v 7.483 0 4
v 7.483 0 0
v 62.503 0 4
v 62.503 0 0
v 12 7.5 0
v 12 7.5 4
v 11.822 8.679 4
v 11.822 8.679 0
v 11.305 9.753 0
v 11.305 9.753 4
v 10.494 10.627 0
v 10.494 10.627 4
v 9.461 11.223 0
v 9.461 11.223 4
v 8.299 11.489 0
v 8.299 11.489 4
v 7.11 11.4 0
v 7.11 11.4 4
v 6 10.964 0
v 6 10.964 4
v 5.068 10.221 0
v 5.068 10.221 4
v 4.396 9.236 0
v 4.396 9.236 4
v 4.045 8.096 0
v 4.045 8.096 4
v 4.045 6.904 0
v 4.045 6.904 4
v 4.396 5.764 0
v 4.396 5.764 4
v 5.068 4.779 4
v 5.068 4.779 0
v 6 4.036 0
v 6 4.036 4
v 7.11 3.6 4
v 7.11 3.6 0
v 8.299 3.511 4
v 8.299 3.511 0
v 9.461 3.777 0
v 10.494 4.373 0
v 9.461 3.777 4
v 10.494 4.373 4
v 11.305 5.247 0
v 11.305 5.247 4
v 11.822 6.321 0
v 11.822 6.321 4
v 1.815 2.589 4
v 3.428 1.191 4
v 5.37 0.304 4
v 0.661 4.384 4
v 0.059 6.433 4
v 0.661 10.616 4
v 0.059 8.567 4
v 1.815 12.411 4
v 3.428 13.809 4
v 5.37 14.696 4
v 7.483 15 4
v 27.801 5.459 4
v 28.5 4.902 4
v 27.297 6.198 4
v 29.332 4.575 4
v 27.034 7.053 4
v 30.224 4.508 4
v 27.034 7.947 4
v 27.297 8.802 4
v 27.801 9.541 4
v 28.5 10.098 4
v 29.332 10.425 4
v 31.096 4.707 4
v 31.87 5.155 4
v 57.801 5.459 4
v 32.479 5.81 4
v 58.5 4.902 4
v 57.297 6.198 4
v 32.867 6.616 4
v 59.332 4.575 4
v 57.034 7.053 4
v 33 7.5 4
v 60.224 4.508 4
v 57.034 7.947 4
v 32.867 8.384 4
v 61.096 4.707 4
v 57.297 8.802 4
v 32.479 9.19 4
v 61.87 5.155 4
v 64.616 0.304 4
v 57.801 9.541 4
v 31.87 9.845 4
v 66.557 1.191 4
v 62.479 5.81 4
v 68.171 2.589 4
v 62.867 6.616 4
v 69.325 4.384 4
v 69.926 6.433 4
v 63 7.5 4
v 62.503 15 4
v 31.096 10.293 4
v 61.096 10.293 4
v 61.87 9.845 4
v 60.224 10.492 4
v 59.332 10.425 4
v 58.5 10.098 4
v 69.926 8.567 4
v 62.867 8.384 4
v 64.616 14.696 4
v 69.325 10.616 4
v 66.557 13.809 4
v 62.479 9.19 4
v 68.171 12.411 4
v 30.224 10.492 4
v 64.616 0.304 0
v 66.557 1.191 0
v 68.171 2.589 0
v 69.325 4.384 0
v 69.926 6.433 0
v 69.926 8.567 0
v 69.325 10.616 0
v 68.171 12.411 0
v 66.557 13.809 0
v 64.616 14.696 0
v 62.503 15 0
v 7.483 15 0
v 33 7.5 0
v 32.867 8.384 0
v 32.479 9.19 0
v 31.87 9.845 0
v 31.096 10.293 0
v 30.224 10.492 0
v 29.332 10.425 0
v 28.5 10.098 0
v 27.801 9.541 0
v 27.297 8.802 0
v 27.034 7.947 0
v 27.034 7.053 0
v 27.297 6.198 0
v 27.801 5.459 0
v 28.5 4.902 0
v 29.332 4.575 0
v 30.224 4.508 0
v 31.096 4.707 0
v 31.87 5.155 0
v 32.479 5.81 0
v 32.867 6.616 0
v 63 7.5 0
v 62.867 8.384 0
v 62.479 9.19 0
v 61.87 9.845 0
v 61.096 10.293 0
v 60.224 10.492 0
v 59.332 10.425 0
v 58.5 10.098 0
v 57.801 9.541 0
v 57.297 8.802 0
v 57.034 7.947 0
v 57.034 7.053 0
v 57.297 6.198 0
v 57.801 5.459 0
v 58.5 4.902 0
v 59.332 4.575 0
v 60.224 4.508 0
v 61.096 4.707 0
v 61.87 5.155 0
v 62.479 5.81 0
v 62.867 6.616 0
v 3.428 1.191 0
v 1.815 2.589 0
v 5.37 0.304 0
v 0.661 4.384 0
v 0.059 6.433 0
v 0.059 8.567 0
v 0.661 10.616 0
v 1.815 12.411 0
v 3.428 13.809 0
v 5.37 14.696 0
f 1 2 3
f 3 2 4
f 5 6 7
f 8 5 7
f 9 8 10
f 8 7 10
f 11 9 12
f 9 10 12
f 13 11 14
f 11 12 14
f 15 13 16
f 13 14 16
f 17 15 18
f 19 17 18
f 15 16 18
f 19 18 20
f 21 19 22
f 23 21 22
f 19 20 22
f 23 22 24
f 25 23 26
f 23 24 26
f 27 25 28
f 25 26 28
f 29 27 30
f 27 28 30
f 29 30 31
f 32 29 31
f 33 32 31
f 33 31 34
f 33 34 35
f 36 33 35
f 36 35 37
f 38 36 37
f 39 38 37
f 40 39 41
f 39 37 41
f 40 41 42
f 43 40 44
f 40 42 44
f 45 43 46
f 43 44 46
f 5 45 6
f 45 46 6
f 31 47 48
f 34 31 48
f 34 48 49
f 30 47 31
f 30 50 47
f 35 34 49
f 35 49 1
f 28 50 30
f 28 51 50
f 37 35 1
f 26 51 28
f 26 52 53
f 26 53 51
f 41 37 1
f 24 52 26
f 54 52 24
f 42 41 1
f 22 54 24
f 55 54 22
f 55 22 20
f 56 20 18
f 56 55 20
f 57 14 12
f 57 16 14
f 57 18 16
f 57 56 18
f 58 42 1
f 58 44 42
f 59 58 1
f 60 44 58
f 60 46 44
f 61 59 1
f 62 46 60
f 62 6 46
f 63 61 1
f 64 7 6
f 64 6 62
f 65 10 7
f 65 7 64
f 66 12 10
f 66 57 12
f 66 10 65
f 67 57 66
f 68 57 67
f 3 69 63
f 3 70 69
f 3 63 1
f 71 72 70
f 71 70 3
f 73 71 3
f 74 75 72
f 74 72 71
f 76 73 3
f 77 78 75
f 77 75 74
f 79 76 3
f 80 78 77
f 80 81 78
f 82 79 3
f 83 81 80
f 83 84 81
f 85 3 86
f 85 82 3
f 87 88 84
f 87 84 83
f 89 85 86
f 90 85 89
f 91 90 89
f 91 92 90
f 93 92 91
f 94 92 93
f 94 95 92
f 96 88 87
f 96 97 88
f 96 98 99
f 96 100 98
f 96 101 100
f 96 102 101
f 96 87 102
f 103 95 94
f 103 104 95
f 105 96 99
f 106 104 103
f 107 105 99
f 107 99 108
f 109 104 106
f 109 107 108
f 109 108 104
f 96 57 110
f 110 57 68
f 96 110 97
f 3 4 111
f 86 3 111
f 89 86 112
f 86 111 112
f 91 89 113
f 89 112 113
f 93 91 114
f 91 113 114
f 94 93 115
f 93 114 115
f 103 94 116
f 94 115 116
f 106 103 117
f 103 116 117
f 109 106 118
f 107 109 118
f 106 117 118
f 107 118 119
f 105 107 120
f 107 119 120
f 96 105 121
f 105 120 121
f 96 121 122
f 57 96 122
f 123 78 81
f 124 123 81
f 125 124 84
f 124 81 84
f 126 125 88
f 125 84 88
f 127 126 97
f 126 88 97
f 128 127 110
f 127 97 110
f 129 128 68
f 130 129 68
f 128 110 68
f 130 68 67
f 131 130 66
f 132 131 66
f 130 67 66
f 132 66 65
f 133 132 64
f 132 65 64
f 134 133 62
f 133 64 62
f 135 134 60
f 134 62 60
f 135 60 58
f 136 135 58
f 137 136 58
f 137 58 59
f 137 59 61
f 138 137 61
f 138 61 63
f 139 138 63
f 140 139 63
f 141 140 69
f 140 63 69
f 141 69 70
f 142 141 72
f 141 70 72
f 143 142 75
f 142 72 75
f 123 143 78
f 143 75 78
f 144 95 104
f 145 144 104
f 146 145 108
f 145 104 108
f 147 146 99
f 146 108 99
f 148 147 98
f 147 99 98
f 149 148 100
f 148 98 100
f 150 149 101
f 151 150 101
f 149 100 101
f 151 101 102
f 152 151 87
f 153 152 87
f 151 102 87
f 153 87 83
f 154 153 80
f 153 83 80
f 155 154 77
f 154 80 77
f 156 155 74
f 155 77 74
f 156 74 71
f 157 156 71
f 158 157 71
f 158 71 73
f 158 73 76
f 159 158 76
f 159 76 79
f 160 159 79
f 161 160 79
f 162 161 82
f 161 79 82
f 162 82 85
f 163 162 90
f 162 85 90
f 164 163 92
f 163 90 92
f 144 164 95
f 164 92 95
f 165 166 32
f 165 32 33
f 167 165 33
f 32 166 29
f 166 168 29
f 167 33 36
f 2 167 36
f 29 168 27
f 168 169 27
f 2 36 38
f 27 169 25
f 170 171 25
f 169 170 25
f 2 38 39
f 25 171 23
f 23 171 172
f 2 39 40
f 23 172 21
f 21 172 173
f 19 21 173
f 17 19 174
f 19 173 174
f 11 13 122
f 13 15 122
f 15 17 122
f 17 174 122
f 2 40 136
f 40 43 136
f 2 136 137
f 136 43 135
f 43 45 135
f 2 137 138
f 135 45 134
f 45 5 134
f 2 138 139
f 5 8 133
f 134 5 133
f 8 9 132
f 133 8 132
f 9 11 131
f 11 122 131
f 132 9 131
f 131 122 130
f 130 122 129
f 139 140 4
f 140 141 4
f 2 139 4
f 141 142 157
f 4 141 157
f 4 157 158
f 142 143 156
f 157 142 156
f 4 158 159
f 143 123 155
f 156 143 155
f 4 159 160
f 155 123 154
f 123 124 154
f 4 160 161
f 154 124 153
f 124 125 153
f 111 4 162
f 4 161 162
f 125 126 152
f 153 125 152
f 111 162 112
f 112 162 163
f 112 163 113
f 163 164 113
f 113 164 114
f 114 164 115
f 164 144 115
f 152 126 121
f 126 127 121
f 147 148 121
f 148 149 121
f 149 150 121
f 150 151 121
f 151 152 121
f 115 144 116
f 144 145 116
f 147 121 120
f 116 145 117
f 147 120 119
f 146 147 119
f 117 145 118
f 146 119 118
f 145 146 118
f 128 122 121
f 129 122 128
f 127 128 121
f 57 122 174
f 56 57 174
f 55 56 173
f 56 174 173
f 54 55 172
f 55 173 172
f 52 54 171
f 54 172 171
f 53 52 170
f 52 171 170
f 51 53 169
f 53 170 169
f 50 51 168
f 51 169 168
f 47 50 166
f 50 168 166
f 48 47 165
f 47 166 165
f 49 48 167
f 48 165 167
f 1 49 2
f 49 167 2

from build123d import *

# Parameters (mm, degrees)
EXTRUDE_1_DEPTH     = 4
SKETCH_2_R          = 4
SKETCH_2_R_2        = 3
CUT_EXTRUDE_1_DEPTH = 4


with BuildPart() as part:
    # Эскиз1 → Бобышка-Вытянуть1 (new body)
    with BuildSketch(Plane.XY):
        with BuildLine():
            Line((7.483128905, 0), (62.502687585, 0))
            ThreePointArc((62.502687585, 0), (70.002687585, 7.5), (62.502687585, 15))
            Line((62.502687585, 15), (7.483128905, 15))
            ThreePointArc((7.483128905, 15), (-0.016871095, 7.5), (7.483128905, 0))
        make_face()
    extrude(amount=EXTRUDE_1_DEPTH)

    # Эскиз2 → Вырез-Вытянуть1 (cut)
    with BuildSketch(Plane.XY.offset(4)):
        with Locations((8, 7.5)):
            Circle(SKETCH_2_R)
        with Locations((30, 7.5)):
            Circle(SKETCH_2_R_2)
        with Locations((60, 7.5)):
            Circle(SKETCH_2_R_2)
    extrude(amount=-CUT_EXTRUDE_1_DEPTH, mode=Mode.SUBTRACT)


solid = part.part
